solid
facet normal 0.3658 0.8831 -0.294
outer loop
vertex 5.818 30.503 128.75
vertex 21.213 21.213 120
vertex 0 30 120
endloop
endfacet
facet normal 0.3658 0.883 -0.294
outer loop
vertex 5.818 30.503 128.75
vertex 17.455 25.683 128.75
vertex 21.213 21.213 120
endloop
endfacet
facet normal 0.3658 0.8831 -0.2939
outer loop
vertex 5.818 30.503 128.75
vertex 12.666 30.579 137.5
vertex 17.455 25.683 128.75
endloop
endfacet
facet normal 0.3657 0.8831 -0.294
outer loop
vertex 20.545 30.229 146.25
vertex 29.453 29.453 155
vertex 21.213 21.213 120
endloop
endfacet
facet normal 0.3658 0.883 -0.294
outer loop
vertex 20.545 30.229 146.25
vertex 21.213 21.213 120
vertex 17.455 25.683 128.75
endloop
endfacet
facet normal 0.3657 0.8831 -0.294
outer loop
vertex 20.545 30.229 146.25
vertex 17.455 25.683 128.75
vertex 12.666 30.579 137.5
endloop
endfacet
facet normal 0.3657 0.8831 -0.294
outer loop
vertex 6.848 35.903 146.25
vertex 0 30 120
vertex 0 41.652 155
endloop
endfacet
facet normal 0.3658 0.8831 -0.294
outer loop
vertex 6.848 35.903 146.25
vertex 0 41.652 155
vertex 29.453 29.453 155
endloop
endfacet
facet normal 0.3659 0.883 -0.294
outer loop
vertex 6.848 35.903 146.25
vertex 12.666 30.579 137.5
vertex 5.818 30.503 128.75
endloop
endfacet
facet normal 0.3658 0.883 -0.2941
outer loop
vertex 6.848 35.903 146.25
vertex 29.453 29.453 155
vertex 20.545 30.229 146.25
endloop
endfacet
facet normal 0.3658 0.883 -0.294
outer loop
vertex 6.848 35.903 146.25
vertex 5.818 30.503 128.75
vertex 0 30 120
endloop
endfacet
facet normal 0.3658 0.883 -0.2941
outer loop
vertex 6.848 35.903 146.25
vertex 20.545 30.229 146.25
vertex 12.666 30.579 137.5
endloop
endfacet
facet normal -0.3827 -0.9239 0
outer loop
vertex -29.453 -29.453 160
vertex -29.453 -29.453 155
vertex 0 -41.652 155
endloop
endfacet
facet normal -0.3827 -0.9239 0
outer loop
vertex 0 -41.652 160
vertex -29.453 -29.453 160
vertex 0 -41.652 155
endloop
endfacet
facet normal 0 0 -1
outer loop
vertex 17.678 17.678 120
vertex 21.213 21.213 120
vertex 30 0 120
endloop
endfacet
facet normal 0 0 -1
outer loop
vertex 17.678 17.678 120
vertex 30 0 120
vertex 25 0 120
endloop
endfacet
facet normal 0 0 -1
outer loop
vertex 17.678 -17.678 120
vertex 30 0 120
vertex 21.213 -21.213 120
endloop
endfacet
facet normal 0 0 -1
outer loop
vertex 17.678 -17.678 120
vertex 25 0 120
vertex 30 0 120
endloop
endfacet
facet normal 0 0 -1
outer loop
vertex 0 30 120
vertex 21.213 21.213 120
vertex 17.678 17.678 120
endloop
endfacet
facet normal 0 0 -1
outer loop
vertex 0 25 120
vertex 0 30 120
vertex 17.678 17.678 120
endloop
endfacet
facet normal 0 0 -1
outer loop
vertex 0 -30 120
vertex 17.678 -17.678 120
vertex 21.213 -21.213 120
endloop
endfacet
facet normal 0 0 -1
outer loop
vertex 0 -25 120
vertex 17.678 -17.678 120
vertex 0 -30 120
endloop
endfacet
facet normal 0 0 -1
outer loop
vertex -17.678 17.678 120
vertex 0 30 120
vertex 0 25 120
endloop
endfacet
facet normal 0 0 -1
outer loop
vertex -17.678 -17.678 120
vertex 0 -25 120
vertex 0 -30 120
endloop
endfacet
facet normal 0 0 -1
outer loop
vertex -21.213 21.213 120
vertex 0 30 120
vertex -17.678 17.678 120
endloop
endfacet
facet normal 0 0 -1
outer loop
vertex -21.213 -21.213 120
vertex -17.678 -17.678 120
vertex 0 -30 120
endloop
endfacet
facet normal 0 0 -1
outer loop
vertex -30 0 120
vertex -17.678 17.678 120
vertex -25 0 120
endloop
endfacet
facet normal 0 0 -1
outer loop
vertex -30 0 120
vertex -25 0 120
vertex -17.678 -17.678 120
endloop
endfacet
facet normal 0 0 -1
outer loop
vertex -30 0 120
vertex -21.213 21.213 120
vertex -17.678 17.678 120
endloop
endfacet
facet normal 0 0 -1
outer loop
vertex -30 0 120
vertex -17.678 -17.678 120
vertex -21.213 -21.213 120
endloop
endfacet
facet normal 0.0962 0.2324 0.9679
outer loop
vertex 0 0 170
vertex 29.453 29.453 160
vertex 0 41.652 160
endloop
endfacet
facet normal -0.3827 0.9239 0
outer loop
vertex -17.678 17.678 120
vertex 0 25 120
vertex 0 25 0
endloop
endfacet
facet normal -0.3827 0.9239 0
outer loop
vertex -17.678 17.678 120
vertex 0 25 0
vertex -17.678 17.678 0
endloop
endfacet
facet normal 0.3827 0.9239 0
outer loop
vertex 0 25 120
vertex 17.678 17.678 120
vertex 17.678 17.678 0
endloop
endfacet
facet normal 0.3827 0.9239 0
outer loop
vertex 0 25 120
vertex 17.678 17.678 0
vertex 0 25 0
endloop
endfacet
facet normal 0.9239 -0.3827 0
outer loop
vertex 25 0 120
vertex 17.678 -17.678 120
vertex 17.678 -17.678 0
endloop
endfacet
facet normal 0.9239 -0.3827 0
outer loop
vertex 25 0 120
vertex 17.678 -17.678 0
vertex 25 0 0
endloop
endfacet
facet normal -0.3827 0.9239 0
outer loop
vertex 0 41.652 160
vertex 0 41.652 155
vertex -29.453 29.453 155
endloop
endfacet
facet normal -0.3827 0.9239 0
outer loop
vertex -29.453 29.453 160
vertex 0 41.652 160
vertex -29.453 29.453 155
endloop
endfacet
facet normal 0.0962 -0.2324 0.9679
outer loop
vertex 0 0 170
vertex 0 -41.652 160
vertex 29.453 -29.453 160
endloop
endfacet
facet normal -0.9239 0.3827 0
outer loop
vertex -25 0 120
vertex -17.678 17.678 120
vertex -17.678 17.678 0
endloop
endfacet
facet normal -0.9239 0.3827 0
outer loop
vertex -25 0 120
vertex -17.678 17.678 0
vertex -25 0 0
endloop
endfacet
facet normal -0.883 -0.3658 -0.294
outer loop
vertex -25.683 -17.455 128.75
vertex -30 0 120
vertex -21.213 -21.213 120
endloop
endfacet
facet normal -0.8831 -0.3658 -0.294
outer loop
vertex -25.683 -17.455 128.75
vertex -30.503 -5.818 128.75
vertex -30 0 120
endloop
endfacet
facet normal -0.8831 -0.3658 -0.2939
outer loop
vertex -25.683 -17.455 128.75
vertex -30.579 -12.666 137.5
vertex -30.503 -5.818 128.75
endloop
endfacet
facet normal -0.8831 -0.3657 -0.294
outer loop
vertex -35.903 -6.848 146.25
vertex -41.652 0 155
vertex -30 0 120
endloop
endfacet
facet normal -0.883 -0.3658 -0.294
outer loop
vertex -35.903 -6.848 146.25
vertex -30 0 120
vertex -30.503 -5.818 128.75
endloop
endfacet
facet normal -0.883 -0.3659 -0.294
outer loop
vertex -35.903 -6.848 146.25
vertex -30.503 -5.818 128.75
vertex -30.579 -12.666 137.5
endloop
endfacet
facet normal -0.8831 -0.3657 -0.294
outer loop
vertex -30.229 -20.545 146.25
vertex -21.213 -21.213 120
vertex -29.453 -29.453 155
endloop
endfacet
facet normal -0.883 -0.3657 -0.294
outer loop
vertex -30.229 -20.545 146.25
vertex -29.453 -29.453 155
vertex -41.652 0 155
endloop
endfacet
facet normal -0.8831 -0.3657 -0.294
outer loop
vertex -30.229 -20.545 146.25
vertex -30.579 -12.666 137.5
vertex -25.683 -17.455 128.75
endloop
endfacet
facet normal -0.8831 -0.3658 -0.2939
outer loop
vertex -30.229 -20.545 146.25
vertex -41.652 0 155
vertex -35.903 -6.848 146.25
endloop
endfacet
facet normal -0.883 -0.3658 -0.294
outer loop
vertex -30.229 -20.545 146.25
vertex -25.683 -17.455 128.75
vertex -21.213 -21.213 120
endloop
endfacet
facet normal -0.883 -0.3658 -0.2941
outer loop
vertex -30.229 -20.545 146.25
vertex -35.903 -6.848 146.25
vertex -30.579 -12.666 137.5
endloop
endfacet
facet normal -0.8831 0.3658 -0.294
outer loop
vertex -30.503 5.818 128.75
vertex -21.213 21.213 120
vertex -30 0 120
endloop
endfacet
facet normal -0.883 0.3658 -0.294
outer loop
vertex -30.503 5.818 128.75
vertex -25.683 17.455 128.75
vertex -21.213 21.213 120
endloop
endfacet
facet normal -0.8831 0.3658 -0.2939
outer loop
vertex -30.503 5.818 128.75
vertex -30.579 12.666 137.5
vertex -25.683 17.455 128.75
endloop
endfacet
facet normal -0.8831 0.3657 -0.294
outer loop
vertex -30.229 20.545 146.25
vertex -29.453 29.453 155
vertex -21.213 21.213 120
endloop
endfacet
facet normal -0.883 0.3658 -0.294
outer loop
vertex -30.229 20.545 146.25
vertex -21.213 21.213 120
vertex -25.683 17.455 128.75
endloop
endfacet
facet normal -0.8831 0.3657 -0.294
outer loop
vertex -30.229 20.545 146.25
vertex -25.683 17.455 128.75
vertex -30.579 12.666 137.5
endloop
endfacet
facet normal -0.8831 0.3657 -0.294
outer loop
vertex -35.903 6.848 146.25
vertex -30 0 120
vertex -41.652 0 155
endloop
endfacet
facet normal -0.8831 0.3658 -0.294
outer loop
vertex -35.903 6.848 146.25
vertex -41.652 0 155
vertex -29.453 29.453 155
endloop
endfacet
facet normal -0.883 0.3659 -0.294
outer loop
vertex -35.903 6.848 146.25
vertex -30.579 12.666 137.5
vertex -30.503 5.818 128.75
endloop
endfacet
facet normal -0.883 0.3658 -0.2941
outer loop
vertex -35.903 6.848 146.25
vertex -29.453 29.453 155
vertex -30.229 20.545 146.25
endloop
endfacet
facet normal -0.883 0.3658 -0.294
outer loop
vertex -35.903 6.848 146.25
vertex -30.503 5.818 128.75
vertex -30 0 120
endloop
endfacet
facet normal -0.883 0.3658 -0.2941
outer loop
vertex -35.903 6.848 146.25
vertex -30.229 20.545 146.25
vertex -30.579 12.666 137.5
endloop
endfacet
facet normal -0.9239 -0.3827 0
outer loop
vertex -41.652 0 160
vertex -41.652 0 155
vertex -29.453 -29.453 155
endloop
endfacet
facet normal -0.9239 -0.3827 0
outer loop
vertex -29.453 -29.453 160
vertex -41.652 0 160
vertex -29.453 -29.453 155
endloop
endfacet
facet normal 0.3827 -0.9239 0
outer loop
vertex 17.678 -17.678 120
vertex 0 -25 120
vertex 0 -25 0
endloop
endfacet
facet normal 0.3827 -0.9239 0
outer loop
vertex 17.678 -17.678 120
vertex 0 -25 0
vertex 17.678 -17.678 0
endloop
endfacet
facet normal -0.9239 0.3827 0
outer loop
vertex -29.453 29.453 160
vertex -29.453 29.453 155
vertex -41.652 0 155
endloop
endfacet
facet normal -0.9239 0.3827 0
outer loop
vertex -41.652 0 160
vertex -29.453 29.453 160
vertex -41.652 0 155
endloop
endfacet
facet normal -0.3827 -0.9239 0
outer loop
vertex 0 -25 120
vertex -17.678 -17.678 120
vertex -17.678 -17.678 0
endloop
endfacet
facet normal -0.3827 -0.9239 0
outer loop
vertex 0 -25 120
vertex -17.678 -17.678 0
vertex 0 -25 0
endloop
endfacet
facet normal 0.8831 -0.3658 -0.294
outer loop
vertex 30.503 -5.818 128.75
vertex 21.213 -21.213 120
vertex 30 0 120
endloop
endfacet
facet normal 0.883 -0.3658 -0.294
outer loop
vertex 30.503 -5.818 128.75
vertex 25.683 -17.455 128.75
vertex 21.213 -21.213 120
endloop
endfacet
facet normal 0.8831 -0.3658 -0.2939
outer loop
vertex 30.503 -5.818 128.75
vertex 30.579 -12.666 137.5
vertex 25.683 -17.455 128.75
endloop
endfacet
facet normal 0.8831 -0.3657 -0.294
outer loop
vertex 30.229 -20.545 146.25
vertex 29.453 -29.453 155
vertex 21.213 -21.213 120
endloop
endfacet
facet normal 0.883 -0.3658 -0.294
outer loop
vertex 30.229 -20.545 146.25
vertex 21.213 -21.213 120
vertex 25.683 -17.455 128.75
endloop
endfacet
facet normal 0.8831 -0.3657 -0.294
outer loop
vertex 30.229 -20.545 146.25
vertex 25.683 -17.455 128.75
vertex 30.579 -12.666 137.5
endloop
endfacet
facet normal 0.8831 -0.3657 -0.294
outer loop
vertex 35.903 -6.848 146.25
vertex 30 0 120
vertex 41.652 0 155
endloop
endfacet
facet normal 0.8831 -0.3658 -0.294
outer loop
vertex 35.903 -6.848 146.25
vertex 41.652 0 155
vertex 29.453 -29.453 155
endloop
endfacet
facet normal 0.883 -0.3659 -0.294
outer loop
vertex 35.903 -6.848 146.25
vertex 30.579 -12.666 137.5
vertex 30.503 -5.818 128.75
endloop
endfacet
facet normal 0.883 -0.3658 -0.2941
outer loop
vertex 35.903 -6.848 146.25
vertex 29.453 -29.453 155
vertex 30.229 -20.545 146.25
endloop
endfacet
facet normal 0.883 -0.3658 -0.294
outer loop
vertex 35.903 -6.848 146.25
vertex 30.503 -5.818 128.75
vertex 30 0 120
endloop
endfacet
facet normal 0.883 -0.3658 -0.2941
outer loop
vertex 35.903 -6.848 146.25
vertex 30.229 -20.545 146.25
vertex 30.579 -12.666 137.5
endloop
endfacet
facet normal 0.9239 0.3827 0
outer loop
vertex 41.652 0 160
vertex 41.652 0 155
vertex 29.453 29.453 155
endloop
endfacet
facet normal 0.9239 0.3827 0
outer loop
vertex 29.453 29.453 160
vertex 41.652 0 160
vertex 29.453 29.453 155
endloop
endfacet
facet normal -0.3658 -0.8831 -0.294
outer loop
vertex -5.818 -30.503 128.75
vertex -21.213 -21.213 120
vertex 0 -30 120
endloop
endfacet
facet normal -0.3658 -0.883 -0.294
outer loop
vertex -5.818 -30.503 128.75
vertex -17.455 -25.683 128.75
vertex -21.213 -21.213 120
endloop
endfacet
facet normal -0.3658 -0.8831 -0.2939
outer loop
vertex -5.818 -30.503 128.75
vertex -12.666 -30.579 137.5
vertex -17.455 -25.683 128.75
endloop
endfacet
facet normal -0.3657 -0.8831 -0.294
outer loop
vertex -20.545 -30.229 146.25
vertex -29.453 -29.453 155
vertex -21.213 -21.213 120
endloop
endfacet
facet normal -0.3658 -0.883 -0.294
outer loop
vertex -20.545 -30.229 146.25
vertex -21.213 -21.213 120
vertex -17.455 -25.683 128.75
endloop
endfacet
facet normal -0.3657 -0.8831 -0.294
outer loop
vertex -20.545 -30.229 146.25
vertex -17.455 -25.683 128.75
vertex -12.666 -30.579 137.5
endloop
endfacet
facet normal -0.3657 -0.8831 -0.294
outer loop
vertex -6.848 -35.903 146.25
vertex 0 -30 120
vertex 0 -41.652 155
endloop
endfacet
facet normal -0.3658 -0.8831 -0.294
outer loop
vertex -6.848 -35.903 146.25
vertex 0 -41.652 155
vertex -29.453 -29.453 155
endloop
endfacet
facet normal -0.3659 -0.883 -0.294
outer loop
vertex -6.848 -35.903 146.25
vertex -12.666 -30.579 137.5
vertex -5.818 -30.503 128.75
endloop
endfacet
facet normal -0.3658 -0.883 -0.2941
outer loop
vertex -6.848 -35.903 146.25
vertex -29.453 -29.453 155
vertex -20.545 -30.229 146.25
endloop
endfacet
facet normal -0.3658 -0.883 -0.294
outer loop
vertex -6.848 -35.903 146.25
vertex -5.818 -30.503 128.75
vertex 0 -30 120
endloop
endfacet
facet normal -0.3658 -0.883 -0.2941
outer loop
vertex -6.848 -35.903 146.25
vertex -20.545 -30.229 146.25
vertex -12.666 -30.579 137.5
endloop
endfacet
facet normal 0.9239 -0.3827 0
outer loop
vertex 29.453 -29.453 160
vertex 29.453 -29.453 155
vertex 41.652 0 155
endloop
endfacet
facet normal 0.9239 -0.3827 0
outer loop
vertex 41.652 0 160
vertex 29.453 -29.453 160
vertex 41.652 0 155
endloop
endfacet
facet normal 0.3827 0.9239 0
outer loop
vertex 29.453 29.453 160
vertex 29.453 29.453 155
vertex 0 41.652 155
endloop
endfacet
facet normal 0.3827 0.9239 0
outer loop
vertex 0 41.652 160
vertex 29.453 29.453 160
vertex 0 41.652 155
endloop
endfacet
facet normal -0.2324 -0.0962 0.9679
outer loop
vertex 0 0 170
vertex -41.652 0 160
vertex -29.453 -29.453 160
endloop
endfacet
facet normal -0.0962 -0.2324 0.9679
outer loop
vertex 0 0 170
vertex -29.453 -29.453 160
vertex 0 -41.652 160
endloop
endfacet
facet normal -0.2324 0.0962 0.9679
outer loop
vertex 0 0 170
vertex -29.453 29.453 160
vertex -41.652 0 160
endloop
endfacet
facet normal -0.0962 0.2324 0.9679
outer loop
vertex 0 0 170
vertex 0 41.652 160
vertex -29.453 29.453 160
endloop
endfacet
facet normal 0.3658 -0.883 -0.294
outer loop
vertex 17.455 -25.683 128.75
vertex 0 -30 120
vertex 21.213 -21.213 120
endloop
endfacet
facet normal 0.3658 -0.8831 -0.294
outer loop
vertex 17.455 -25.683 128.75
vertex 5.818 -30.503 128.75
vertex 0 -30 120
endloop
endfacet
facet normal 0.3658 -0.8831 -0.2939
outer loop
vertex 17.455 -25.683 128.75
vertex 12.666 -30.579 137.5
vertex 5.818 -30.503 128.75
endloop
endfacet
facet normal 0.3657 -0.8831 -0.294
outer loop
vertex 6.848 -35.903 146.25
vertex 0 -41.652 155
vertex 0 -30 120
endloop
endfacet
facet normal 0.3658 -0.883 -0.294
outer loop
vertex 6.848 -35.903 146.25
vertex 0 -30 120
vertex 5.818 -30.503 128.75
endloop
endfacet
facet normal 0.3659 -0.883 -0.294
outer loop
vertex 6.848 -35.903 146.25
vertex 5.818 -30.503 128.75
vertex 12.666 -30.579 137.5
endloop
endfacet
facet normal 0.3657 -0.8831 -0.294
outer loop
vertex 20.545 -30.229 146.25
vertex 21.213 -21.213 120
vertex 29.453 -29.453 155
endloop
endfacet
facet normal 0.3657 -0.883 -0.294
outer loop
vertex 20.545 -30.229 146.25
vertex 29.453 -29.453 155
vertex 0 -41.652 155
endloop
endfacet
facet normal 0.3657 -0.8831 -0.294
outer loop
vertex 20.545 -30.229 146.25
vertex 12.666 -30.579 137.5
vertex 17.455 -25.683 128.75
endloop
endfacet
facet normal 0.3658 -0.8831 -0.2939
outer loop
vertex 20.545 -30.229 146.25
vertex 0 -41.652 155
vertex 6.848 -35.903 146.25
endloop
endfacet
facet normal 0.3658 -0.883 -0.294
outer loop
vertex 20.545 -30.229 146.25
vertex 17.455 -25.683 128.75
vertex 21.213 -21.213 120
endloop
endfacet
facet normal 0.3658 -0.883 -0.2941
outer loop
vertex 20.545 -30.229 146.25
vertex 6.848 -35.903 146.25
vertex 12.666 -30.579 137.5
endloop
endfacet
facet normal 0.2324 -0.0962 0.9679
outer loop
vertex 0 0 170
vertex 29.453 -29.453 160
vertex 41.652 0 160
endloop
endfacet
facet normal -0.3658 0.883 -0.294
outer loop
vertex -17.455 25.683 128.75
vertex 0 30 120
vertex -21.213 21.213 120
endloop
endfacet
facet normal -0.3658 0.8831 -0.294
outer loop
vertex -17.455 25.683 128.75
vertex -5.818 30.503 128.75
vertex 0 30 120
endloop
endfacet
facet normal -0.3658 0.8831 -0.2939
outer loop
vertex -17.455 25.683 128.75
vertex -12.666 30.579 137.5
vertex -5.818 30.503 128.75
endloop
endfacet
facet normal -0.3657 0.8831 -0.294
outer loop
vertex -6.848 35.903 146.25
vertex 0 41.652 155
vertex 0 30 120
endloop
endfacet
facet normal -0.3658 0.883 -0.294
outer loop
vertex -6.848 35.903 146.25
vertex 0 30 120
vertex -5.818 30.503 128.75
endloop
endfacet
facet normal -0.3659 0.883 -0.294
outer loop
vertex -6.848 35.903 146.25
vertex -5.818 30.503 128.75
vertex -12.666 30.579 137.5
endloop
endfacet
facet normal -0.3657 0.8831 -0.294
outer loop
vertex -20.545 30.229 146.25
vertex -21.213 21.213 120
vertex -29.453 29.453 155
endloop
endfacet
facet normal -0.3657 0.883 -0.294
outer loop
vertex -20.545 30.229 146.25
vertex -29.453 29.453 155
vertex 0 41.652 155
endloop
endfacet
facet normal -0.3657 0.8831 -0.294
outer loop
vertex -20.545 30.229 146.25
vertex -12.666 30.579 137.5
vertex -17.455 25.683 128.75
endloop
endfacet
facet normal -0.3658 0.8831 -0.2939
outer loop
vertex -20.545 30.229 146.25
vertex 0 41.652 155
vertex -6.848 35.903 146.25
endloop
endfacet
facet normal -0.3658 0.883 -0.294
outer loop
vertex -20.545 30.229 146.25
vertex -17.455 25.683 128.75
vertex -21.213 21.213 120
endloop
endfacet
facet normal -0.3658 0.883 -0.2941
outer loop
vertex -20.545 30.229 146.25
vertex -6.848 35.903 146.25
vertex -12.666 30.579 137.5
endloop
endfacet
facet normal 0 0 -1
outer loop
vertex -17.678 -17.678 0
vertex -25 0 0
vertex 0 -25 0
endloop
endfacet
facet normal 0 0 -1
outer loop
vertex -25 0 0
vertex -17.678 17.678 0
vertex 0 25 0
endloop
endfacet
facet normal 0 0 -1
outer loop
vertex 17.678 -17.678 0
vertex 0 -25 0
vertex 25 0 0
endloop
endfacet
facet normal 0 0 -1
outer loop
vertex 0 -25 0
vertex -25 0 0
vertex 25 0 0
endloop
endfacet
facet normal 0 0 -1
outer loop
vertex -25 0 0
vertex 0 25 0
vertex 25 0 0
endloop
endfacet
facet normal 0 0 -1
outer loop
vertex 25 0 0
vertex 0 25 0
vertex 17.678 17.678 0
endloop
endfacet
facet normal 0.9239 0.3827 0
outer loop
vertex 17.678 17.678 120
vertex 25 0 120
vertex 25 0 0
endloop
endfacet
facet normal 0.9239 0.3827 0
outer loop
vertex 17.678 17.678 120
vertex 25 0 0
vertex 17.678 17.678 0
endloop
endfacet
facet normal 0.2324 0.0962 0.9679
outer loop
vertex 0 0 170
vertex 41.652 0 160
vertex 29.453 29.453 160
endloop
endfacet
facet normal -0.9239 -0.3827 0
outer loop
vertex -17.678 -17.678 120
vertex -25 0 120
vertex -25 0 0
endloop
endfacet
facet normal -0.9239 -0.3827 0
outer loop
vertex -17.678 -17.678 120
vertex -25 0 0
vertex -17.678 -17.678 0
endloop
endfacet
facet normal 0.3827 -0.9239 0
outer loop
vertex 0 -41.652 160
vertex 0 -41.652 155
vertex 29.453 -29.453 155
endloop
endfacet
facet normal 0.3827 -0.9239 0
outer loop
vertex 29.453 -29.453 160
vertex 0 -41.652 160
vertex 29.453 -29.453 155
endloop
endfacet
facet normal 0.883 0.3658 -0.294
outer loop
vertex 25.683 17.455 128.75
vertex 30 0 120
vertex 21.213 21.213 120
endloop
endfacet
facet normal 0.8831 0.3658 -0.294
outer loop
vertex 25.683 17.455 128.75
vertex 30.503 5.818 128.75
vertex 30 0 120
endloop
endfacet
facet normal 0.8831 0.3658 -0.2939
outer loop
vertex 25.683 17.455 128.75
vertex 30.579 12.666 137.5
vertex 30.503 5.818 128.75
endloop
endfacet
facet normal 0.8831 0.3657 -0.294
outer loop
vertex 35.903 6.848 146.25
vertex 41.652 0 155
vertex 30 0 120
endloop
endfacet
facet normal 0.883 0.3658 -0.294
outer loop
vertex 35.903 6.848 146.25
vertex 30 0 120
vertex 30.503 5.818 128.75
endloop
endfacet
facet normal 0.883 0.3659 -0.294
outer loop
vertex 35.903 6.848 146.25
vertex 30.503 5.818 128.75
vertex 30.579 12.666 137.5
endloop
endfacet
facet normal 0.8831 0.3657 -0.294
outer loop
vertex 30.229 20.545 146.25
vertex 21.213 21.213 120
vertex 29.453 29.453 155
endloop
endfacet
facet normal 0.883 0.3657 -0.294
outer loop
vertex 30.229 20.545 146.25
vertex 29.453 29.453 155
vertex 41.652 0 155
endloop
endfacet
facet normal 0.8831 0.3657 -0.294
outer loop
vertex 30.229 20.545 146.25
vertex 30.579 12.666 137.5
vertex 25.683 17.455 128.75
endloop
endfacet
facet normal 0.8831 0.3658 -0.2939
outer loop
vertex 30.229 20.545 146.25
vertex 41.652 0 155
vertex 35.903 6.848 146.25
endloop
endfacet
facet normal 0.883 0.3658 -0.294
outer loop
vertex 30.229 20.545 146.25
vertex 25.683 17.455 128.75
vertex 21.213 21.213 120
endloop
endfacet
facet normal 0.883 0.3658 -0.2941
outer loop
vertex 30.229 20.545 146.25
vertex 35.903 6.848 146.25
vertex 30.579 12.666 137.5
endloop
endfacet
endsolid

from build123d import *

# Parameters (mm, degrees)
F5_DEPTH = 120
F9_DEPTH = 5


with BuildPart() as f5:
    # F4 (on Top) → F5 (new body, through all)
    with BuildSketch(Plane.XY):
        Polygon((17.6776695297, 17.6776695297), (0, 25), (-17.6776695297, 17.6776695297), (-25, 0), (-17.6776695297, -17.6776695297), (0, -25), (17.6776695297, -17.6776695297), (25, 0), align=None)
    extrude(amount=F5_DEPTH)

    # F6 (on offset) → F8 section 0
    with BuildSketch(Plane.XY.offset(120)):
        Polygon((21.2132034356, 21.2132034356), (0, 30), (-21.2132034356, 21.2132034356), (-30, 0), (-21.2132034356, -21.2132034356), (0, -30), (21.2132034356, -21.2132034356), (30, 0), align=None)
    # F7 (on offset) → F8 section 1
    with BuildSketch(Plane.XY.offset(155)):
        Polygon((29.4525549142, 29.4525549142), (0, 41.6522026062), (-29.4525549142, 29.4525549142), (-41.6522026062, 0), (-29.4525549142, -29.4525549142), (0, -41.6522026062), (29.4525549142, -29.4525549142), (41.6522026062, 0), align=None)
    loft()

    # F9 (add, through all): a face of the model
    f9_faces = [f5.faces().sort_by_distance(p)[0] for p in [
        (0, 0, 155),
    ]]
    extrude(f9_faces, amount=F9_DEPTH)

    # F9_face (on face) → F11 section 0
    with BuildSketch(Plane.XY.offset(160), mode=Mode.PRIVATE) as f11_s0:
        Polygon((29.4525549142, -29.4525549142), (41.6522026062, 0), (29.4525549142, 29.4525549142), (0, 41.6522026062), (-29.4525549142, 29.4525549142), (-41.6522026062, 0), (-29.4525549142, -29.4525549142), (0, -41.6522026062), align=None)
    loft([f11_s0.sketch, Vertex(0, 0, 170)])


solid = f5.part
